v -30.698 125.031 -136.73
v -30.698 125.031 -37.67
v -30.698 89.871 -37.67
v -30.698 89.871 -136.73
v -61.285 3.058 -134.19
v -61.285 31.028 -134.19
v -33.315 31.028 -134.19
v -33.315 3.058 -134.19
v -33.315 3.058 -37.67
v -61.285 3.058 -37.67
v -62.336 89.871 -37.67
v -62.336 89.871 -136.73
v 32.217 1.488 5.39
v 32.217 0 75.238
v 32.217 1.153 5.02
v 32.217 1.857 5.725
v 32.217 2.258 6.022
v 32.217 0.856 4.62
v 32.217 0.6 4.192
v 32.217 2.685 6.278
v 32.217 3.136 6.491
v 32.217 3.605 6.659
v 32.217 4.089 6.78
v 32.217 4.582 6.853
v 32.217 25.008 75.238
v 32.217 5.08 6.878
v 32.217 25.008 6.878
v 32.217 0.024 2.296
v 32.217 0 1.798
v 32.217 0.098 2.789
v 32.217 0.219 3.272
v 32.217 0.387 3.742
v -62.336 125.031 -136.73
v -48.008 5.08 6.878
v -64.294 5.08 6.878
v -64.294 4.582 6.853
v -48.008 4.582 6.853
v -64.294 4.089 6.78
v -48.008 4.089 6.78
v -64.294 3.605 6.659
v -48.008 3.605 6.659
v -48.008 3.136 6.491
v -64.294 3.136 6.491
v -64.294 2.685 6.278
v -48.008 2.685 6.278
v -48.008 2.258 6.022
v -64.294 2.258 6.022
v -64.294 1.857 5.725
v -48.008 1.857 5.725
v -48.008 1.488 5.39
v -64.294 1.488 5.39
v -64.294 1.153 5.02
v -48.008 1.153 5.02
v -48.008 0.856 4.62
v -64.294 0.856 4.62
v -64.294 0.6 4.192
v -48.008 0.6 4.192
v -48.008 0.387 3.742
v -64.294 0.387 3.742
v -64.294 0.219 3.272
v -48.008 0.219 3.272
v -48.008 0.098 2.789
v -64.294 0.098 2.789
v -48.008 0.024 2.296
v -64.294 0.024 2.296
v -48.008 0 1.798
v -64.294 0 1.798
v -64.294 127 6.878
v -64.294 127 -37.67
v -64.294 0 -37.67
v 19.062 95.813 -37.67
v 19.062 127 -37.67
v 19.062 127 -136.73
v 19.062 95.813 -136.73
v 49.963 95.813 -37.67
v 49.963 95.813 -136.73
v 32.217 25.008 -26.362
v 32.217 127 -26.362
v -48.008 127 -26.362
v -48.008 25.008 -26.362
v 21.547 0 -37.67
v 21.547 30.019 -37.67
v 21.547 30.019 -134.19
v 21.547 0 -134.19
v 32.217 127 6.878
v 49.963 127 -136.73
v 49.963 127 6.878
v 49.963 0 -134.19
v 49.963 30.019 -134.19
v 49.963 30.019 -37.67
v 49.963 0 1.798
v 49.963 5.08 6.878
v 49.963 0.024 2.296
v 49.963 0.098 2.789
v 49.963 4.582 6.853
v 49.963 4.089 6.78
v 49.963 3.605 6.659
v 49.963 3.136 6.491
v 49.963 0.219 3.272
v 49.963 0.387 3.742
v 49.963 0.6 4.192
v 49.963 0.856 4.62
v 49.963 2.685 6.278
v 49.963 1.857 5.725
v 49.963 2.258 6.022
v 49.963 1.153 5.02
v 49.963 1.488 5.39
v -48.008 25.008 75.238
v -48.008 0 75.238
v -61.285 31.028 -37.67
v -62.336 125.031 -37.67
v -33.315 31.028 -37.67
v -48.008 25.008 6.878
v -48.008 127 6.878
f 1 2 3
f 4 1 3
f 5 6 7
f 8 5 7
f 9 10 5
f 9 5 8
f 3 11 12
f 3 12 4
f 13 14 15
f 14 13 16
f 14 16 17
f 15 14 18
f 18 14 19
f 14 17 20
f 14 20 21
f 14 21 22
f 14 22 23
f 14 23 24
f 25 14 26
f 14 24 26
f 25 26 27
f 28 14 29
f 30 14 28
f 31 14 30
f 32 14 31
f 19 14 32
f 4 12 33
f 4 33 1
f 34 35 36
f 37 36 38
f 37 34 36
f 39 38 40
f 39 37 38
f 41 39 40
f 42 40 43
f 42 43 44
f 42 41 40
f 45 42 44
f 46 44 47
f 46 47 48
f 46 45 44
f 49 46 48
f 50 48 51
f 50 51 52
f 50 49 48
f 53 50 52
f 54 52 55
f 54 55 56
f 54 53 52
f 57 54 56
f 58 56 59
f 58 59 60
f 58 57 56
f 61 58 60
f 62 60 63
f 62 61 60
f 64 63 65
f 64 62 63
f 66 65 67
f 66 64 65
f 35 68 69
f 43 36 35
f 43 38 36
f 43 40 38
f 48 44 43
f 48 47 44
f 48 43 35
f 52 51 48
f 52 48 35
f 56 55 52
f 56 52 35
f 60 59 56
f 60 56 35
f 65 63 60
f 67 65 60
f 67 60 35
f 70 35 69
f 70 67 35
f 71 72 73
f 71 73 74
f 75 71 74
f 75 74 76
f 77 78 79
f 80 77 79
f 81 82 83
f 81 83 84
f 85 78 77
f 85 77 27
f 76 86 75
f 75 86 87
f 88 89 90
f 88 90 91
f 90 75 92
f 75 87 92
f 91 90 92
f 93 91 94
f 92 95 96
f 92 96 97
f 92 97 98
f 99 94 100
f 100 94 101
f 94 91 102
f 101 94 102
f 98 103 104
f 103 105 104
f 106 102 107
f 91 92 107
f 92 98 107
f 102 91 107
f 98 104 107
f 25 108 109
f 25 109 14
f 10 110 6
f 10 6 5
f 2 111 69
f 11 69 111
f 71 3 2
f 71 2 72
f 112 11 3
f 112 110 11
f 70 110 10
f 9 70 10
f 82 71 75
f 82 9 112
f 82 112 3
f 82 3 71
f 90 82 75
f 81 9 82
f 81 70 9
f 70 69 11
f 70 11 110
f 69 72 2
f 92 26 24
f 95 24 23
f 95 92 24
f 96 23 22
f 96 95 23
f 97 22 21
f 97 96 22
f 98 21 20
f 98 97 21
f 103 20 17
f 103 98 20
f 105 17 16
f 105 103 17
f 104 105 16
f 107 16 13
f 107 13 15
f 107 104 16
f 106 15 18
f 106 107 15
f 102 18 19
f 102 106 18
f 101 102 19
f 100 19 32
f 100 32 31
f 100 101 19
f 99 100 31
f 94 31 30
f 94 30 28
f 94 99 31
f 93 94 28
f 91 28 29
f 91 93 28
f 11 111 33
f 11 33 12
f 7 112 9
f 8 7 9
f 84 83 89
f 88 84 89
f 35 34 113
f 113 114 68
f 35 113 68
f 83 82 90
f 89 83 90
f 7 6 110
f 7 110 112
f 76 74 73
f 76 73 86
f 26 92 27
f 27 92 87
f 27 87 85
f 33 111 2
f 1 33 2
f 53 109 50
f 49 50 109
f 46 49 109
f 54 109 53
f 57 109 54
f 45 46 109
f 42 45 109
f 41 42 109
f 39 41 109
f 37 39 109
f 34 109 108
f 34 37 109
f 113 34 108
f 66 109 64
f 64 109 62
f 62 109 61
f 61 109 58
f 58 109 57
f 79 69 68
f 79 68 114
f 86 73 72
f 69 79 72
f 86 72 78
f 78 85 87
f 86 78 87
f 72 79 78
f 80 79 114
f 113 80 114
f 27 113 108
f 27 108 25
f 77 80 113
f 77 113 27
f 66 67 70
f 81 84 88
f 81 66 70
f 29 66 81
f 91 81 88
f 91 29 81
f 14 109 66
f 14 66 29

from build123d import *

# Parameters (mm, degrees)
F1_DEPTH  = 127
F2_W      = 80.2252367139
F2_H      = 66.4800778031
F3_DEPTH  = 127
F4_W      = 17.7462361753
F4_H      = 33.2400389016
F4_W_2    = 16.2856578827
F5_DEPTH  = 152.4
F6_W      = 80.2252367139
F6_H      = 25.0078588724
F7_DEPTH  = 101.6
F8_W      = 27.9699675739
F8_H      = 27.9699731618
F9_DEPTH  = 152.4
F10_DEPTH = 50.8
F11_DEPTH = 106.68
F12_W     = 28.4161847085
F12_H     = 30.0192423165
F13_DEPTH = 96.52
F14_W     = 30.9016443789
F14_H     = 31.186911881
F15_DEPTH = 99.06
F16_W     = 31.6377300769
F16_H     = 35.1597964764
F17_DEPTH = 99.06
F18_R     = 5.08
F19_R     = 5.08


with BuildPart() as f1:
    # F0 (on Front) → F1 (new body)
    with BuildSketch(Plane.XZ):
        Polygon((41.0551093519, 40.1177741587), (-64.293846488, 40.1177741587), (-64.293846488, -37.670340389), (49.9632842839, -37.670340389), (49.9632842839, 40.1177741587), align=None)
    extrude(amount=-F1_DEPTH)

    # F2 (on face) → F3 (cut)
    with BuildSketch(Plane(origin=(0, 127, 0), x_dir=(-1, 0, 0), z_dir=(0, 1, 0))):
        with Locations((7.8955702484, 6.8777352571)):
            Rectangle(F2_W, F2_H)
    extrude(amount=-F3_DEPTH, mode=Mode.SUBTRACT)

    # F4 (on face) → F5 (cut)
    with BuildSketch(Plane(origin=(0, 127, 0), x_dir=(-1, 0, 0), z_dir=(0, 1, 0))):
        with Locations((-41.0901661962, 23.4977547079)):
            Rectangle(F4_W, F4_H)
        with Locations((56.1510175467, 23.4977547079)):
            Rectangle(F4_W_2, F4_H)
    extrude(amount=-F5_DEPTH, mode=Mode.SUBTRACT)

    # F6 (on face) → F7 (join)
    with BuildSketch(Plane.XY.offset(-26.3623036444)):
        with Locations((-7.8955702484, 12.5039294362)):
            Rectangle(F6_W, F6_H)
    extrude(amount=F7_DEPTH)

    # F8 (on face) → F9 (join)
    with BuildSketch(Plane(origin=(0, 0, -37.670340389), x_dir=(1, 0, 0), z_dir=(0, 0, -1))):
        with Locations((-47.3000053316, -17.0427551493)):
            Rectangle(F8_W, F8_H)
    extrude(amount=F9_DEPTH)

    # F10 (add): a face of the model
    f10_faces = [f1.faces().sort_by_distance(p)[0] for p in [
        (-47.3000053316, 17.0427551493, -190.070340389),
    ]]
    extrude(f10_faces, amount=F10_DEPTH)

    # F11 (cut): a face of the model
    f11_faces = [f1.faces().sort_by_distance(p)[0] for p in [
        (-47.3000053316, 17.0427551493, -240.870340389),
    ]]
    extrude(f11_faces, amount=-F11_DEPTH, mode=Mode.SUBTRACT)

    # F12 (on face) → F13 (join)
    with BuildSketch(Plane(origin=(0, 0, -37.670340389), x_dir=(1, 0, 0), z_dir=(0, 0, -1))):
        with Locations((35.7551919296, -15.0096211582)):
            Rectangle(F12_W, F12_H)
    extrude(amount=F13_DEPTH)

    # F14 (on face) → F15 (join)
    with BuildSketch(Plane(origin=(0, 0, -37.670340389), x_dir=(1, 0, 0), z_dir=(0, 0, -1))):
        with Locations((34.5124620944, -111.4065440595)):
            Rectangle(F14_W, F14_H)
    extrude(amount=F15_DEPTH)

    # F16 (on face) → F17 (join)
    with BuildSketch(Plane(origin=(0, 0, -37.670340389), x_dir=(1, 0, 0), z_dir=(0, 0, -1))):
        with Locations((-46.5169167146, -107.4508428574)):
            Rectangle(F16_W, F16_H)
    extrude(amount=F17_DEPTH)

    # F18
    f18_edges = [f1.edges().sort_by_distance(p)[0] for p in [
        (-56.151018, 0, 6.877735),
    ]]
    fillet(f18_edges, radius=F18_R)

    # F19
    f19_edges = [f1.edges().sort_by_distance(p)[0] for p in [
        (41.090166, 0, 6.877735),
    ]]
    fillet(f19_edges, radius=F19_R)


solid = f1.part
